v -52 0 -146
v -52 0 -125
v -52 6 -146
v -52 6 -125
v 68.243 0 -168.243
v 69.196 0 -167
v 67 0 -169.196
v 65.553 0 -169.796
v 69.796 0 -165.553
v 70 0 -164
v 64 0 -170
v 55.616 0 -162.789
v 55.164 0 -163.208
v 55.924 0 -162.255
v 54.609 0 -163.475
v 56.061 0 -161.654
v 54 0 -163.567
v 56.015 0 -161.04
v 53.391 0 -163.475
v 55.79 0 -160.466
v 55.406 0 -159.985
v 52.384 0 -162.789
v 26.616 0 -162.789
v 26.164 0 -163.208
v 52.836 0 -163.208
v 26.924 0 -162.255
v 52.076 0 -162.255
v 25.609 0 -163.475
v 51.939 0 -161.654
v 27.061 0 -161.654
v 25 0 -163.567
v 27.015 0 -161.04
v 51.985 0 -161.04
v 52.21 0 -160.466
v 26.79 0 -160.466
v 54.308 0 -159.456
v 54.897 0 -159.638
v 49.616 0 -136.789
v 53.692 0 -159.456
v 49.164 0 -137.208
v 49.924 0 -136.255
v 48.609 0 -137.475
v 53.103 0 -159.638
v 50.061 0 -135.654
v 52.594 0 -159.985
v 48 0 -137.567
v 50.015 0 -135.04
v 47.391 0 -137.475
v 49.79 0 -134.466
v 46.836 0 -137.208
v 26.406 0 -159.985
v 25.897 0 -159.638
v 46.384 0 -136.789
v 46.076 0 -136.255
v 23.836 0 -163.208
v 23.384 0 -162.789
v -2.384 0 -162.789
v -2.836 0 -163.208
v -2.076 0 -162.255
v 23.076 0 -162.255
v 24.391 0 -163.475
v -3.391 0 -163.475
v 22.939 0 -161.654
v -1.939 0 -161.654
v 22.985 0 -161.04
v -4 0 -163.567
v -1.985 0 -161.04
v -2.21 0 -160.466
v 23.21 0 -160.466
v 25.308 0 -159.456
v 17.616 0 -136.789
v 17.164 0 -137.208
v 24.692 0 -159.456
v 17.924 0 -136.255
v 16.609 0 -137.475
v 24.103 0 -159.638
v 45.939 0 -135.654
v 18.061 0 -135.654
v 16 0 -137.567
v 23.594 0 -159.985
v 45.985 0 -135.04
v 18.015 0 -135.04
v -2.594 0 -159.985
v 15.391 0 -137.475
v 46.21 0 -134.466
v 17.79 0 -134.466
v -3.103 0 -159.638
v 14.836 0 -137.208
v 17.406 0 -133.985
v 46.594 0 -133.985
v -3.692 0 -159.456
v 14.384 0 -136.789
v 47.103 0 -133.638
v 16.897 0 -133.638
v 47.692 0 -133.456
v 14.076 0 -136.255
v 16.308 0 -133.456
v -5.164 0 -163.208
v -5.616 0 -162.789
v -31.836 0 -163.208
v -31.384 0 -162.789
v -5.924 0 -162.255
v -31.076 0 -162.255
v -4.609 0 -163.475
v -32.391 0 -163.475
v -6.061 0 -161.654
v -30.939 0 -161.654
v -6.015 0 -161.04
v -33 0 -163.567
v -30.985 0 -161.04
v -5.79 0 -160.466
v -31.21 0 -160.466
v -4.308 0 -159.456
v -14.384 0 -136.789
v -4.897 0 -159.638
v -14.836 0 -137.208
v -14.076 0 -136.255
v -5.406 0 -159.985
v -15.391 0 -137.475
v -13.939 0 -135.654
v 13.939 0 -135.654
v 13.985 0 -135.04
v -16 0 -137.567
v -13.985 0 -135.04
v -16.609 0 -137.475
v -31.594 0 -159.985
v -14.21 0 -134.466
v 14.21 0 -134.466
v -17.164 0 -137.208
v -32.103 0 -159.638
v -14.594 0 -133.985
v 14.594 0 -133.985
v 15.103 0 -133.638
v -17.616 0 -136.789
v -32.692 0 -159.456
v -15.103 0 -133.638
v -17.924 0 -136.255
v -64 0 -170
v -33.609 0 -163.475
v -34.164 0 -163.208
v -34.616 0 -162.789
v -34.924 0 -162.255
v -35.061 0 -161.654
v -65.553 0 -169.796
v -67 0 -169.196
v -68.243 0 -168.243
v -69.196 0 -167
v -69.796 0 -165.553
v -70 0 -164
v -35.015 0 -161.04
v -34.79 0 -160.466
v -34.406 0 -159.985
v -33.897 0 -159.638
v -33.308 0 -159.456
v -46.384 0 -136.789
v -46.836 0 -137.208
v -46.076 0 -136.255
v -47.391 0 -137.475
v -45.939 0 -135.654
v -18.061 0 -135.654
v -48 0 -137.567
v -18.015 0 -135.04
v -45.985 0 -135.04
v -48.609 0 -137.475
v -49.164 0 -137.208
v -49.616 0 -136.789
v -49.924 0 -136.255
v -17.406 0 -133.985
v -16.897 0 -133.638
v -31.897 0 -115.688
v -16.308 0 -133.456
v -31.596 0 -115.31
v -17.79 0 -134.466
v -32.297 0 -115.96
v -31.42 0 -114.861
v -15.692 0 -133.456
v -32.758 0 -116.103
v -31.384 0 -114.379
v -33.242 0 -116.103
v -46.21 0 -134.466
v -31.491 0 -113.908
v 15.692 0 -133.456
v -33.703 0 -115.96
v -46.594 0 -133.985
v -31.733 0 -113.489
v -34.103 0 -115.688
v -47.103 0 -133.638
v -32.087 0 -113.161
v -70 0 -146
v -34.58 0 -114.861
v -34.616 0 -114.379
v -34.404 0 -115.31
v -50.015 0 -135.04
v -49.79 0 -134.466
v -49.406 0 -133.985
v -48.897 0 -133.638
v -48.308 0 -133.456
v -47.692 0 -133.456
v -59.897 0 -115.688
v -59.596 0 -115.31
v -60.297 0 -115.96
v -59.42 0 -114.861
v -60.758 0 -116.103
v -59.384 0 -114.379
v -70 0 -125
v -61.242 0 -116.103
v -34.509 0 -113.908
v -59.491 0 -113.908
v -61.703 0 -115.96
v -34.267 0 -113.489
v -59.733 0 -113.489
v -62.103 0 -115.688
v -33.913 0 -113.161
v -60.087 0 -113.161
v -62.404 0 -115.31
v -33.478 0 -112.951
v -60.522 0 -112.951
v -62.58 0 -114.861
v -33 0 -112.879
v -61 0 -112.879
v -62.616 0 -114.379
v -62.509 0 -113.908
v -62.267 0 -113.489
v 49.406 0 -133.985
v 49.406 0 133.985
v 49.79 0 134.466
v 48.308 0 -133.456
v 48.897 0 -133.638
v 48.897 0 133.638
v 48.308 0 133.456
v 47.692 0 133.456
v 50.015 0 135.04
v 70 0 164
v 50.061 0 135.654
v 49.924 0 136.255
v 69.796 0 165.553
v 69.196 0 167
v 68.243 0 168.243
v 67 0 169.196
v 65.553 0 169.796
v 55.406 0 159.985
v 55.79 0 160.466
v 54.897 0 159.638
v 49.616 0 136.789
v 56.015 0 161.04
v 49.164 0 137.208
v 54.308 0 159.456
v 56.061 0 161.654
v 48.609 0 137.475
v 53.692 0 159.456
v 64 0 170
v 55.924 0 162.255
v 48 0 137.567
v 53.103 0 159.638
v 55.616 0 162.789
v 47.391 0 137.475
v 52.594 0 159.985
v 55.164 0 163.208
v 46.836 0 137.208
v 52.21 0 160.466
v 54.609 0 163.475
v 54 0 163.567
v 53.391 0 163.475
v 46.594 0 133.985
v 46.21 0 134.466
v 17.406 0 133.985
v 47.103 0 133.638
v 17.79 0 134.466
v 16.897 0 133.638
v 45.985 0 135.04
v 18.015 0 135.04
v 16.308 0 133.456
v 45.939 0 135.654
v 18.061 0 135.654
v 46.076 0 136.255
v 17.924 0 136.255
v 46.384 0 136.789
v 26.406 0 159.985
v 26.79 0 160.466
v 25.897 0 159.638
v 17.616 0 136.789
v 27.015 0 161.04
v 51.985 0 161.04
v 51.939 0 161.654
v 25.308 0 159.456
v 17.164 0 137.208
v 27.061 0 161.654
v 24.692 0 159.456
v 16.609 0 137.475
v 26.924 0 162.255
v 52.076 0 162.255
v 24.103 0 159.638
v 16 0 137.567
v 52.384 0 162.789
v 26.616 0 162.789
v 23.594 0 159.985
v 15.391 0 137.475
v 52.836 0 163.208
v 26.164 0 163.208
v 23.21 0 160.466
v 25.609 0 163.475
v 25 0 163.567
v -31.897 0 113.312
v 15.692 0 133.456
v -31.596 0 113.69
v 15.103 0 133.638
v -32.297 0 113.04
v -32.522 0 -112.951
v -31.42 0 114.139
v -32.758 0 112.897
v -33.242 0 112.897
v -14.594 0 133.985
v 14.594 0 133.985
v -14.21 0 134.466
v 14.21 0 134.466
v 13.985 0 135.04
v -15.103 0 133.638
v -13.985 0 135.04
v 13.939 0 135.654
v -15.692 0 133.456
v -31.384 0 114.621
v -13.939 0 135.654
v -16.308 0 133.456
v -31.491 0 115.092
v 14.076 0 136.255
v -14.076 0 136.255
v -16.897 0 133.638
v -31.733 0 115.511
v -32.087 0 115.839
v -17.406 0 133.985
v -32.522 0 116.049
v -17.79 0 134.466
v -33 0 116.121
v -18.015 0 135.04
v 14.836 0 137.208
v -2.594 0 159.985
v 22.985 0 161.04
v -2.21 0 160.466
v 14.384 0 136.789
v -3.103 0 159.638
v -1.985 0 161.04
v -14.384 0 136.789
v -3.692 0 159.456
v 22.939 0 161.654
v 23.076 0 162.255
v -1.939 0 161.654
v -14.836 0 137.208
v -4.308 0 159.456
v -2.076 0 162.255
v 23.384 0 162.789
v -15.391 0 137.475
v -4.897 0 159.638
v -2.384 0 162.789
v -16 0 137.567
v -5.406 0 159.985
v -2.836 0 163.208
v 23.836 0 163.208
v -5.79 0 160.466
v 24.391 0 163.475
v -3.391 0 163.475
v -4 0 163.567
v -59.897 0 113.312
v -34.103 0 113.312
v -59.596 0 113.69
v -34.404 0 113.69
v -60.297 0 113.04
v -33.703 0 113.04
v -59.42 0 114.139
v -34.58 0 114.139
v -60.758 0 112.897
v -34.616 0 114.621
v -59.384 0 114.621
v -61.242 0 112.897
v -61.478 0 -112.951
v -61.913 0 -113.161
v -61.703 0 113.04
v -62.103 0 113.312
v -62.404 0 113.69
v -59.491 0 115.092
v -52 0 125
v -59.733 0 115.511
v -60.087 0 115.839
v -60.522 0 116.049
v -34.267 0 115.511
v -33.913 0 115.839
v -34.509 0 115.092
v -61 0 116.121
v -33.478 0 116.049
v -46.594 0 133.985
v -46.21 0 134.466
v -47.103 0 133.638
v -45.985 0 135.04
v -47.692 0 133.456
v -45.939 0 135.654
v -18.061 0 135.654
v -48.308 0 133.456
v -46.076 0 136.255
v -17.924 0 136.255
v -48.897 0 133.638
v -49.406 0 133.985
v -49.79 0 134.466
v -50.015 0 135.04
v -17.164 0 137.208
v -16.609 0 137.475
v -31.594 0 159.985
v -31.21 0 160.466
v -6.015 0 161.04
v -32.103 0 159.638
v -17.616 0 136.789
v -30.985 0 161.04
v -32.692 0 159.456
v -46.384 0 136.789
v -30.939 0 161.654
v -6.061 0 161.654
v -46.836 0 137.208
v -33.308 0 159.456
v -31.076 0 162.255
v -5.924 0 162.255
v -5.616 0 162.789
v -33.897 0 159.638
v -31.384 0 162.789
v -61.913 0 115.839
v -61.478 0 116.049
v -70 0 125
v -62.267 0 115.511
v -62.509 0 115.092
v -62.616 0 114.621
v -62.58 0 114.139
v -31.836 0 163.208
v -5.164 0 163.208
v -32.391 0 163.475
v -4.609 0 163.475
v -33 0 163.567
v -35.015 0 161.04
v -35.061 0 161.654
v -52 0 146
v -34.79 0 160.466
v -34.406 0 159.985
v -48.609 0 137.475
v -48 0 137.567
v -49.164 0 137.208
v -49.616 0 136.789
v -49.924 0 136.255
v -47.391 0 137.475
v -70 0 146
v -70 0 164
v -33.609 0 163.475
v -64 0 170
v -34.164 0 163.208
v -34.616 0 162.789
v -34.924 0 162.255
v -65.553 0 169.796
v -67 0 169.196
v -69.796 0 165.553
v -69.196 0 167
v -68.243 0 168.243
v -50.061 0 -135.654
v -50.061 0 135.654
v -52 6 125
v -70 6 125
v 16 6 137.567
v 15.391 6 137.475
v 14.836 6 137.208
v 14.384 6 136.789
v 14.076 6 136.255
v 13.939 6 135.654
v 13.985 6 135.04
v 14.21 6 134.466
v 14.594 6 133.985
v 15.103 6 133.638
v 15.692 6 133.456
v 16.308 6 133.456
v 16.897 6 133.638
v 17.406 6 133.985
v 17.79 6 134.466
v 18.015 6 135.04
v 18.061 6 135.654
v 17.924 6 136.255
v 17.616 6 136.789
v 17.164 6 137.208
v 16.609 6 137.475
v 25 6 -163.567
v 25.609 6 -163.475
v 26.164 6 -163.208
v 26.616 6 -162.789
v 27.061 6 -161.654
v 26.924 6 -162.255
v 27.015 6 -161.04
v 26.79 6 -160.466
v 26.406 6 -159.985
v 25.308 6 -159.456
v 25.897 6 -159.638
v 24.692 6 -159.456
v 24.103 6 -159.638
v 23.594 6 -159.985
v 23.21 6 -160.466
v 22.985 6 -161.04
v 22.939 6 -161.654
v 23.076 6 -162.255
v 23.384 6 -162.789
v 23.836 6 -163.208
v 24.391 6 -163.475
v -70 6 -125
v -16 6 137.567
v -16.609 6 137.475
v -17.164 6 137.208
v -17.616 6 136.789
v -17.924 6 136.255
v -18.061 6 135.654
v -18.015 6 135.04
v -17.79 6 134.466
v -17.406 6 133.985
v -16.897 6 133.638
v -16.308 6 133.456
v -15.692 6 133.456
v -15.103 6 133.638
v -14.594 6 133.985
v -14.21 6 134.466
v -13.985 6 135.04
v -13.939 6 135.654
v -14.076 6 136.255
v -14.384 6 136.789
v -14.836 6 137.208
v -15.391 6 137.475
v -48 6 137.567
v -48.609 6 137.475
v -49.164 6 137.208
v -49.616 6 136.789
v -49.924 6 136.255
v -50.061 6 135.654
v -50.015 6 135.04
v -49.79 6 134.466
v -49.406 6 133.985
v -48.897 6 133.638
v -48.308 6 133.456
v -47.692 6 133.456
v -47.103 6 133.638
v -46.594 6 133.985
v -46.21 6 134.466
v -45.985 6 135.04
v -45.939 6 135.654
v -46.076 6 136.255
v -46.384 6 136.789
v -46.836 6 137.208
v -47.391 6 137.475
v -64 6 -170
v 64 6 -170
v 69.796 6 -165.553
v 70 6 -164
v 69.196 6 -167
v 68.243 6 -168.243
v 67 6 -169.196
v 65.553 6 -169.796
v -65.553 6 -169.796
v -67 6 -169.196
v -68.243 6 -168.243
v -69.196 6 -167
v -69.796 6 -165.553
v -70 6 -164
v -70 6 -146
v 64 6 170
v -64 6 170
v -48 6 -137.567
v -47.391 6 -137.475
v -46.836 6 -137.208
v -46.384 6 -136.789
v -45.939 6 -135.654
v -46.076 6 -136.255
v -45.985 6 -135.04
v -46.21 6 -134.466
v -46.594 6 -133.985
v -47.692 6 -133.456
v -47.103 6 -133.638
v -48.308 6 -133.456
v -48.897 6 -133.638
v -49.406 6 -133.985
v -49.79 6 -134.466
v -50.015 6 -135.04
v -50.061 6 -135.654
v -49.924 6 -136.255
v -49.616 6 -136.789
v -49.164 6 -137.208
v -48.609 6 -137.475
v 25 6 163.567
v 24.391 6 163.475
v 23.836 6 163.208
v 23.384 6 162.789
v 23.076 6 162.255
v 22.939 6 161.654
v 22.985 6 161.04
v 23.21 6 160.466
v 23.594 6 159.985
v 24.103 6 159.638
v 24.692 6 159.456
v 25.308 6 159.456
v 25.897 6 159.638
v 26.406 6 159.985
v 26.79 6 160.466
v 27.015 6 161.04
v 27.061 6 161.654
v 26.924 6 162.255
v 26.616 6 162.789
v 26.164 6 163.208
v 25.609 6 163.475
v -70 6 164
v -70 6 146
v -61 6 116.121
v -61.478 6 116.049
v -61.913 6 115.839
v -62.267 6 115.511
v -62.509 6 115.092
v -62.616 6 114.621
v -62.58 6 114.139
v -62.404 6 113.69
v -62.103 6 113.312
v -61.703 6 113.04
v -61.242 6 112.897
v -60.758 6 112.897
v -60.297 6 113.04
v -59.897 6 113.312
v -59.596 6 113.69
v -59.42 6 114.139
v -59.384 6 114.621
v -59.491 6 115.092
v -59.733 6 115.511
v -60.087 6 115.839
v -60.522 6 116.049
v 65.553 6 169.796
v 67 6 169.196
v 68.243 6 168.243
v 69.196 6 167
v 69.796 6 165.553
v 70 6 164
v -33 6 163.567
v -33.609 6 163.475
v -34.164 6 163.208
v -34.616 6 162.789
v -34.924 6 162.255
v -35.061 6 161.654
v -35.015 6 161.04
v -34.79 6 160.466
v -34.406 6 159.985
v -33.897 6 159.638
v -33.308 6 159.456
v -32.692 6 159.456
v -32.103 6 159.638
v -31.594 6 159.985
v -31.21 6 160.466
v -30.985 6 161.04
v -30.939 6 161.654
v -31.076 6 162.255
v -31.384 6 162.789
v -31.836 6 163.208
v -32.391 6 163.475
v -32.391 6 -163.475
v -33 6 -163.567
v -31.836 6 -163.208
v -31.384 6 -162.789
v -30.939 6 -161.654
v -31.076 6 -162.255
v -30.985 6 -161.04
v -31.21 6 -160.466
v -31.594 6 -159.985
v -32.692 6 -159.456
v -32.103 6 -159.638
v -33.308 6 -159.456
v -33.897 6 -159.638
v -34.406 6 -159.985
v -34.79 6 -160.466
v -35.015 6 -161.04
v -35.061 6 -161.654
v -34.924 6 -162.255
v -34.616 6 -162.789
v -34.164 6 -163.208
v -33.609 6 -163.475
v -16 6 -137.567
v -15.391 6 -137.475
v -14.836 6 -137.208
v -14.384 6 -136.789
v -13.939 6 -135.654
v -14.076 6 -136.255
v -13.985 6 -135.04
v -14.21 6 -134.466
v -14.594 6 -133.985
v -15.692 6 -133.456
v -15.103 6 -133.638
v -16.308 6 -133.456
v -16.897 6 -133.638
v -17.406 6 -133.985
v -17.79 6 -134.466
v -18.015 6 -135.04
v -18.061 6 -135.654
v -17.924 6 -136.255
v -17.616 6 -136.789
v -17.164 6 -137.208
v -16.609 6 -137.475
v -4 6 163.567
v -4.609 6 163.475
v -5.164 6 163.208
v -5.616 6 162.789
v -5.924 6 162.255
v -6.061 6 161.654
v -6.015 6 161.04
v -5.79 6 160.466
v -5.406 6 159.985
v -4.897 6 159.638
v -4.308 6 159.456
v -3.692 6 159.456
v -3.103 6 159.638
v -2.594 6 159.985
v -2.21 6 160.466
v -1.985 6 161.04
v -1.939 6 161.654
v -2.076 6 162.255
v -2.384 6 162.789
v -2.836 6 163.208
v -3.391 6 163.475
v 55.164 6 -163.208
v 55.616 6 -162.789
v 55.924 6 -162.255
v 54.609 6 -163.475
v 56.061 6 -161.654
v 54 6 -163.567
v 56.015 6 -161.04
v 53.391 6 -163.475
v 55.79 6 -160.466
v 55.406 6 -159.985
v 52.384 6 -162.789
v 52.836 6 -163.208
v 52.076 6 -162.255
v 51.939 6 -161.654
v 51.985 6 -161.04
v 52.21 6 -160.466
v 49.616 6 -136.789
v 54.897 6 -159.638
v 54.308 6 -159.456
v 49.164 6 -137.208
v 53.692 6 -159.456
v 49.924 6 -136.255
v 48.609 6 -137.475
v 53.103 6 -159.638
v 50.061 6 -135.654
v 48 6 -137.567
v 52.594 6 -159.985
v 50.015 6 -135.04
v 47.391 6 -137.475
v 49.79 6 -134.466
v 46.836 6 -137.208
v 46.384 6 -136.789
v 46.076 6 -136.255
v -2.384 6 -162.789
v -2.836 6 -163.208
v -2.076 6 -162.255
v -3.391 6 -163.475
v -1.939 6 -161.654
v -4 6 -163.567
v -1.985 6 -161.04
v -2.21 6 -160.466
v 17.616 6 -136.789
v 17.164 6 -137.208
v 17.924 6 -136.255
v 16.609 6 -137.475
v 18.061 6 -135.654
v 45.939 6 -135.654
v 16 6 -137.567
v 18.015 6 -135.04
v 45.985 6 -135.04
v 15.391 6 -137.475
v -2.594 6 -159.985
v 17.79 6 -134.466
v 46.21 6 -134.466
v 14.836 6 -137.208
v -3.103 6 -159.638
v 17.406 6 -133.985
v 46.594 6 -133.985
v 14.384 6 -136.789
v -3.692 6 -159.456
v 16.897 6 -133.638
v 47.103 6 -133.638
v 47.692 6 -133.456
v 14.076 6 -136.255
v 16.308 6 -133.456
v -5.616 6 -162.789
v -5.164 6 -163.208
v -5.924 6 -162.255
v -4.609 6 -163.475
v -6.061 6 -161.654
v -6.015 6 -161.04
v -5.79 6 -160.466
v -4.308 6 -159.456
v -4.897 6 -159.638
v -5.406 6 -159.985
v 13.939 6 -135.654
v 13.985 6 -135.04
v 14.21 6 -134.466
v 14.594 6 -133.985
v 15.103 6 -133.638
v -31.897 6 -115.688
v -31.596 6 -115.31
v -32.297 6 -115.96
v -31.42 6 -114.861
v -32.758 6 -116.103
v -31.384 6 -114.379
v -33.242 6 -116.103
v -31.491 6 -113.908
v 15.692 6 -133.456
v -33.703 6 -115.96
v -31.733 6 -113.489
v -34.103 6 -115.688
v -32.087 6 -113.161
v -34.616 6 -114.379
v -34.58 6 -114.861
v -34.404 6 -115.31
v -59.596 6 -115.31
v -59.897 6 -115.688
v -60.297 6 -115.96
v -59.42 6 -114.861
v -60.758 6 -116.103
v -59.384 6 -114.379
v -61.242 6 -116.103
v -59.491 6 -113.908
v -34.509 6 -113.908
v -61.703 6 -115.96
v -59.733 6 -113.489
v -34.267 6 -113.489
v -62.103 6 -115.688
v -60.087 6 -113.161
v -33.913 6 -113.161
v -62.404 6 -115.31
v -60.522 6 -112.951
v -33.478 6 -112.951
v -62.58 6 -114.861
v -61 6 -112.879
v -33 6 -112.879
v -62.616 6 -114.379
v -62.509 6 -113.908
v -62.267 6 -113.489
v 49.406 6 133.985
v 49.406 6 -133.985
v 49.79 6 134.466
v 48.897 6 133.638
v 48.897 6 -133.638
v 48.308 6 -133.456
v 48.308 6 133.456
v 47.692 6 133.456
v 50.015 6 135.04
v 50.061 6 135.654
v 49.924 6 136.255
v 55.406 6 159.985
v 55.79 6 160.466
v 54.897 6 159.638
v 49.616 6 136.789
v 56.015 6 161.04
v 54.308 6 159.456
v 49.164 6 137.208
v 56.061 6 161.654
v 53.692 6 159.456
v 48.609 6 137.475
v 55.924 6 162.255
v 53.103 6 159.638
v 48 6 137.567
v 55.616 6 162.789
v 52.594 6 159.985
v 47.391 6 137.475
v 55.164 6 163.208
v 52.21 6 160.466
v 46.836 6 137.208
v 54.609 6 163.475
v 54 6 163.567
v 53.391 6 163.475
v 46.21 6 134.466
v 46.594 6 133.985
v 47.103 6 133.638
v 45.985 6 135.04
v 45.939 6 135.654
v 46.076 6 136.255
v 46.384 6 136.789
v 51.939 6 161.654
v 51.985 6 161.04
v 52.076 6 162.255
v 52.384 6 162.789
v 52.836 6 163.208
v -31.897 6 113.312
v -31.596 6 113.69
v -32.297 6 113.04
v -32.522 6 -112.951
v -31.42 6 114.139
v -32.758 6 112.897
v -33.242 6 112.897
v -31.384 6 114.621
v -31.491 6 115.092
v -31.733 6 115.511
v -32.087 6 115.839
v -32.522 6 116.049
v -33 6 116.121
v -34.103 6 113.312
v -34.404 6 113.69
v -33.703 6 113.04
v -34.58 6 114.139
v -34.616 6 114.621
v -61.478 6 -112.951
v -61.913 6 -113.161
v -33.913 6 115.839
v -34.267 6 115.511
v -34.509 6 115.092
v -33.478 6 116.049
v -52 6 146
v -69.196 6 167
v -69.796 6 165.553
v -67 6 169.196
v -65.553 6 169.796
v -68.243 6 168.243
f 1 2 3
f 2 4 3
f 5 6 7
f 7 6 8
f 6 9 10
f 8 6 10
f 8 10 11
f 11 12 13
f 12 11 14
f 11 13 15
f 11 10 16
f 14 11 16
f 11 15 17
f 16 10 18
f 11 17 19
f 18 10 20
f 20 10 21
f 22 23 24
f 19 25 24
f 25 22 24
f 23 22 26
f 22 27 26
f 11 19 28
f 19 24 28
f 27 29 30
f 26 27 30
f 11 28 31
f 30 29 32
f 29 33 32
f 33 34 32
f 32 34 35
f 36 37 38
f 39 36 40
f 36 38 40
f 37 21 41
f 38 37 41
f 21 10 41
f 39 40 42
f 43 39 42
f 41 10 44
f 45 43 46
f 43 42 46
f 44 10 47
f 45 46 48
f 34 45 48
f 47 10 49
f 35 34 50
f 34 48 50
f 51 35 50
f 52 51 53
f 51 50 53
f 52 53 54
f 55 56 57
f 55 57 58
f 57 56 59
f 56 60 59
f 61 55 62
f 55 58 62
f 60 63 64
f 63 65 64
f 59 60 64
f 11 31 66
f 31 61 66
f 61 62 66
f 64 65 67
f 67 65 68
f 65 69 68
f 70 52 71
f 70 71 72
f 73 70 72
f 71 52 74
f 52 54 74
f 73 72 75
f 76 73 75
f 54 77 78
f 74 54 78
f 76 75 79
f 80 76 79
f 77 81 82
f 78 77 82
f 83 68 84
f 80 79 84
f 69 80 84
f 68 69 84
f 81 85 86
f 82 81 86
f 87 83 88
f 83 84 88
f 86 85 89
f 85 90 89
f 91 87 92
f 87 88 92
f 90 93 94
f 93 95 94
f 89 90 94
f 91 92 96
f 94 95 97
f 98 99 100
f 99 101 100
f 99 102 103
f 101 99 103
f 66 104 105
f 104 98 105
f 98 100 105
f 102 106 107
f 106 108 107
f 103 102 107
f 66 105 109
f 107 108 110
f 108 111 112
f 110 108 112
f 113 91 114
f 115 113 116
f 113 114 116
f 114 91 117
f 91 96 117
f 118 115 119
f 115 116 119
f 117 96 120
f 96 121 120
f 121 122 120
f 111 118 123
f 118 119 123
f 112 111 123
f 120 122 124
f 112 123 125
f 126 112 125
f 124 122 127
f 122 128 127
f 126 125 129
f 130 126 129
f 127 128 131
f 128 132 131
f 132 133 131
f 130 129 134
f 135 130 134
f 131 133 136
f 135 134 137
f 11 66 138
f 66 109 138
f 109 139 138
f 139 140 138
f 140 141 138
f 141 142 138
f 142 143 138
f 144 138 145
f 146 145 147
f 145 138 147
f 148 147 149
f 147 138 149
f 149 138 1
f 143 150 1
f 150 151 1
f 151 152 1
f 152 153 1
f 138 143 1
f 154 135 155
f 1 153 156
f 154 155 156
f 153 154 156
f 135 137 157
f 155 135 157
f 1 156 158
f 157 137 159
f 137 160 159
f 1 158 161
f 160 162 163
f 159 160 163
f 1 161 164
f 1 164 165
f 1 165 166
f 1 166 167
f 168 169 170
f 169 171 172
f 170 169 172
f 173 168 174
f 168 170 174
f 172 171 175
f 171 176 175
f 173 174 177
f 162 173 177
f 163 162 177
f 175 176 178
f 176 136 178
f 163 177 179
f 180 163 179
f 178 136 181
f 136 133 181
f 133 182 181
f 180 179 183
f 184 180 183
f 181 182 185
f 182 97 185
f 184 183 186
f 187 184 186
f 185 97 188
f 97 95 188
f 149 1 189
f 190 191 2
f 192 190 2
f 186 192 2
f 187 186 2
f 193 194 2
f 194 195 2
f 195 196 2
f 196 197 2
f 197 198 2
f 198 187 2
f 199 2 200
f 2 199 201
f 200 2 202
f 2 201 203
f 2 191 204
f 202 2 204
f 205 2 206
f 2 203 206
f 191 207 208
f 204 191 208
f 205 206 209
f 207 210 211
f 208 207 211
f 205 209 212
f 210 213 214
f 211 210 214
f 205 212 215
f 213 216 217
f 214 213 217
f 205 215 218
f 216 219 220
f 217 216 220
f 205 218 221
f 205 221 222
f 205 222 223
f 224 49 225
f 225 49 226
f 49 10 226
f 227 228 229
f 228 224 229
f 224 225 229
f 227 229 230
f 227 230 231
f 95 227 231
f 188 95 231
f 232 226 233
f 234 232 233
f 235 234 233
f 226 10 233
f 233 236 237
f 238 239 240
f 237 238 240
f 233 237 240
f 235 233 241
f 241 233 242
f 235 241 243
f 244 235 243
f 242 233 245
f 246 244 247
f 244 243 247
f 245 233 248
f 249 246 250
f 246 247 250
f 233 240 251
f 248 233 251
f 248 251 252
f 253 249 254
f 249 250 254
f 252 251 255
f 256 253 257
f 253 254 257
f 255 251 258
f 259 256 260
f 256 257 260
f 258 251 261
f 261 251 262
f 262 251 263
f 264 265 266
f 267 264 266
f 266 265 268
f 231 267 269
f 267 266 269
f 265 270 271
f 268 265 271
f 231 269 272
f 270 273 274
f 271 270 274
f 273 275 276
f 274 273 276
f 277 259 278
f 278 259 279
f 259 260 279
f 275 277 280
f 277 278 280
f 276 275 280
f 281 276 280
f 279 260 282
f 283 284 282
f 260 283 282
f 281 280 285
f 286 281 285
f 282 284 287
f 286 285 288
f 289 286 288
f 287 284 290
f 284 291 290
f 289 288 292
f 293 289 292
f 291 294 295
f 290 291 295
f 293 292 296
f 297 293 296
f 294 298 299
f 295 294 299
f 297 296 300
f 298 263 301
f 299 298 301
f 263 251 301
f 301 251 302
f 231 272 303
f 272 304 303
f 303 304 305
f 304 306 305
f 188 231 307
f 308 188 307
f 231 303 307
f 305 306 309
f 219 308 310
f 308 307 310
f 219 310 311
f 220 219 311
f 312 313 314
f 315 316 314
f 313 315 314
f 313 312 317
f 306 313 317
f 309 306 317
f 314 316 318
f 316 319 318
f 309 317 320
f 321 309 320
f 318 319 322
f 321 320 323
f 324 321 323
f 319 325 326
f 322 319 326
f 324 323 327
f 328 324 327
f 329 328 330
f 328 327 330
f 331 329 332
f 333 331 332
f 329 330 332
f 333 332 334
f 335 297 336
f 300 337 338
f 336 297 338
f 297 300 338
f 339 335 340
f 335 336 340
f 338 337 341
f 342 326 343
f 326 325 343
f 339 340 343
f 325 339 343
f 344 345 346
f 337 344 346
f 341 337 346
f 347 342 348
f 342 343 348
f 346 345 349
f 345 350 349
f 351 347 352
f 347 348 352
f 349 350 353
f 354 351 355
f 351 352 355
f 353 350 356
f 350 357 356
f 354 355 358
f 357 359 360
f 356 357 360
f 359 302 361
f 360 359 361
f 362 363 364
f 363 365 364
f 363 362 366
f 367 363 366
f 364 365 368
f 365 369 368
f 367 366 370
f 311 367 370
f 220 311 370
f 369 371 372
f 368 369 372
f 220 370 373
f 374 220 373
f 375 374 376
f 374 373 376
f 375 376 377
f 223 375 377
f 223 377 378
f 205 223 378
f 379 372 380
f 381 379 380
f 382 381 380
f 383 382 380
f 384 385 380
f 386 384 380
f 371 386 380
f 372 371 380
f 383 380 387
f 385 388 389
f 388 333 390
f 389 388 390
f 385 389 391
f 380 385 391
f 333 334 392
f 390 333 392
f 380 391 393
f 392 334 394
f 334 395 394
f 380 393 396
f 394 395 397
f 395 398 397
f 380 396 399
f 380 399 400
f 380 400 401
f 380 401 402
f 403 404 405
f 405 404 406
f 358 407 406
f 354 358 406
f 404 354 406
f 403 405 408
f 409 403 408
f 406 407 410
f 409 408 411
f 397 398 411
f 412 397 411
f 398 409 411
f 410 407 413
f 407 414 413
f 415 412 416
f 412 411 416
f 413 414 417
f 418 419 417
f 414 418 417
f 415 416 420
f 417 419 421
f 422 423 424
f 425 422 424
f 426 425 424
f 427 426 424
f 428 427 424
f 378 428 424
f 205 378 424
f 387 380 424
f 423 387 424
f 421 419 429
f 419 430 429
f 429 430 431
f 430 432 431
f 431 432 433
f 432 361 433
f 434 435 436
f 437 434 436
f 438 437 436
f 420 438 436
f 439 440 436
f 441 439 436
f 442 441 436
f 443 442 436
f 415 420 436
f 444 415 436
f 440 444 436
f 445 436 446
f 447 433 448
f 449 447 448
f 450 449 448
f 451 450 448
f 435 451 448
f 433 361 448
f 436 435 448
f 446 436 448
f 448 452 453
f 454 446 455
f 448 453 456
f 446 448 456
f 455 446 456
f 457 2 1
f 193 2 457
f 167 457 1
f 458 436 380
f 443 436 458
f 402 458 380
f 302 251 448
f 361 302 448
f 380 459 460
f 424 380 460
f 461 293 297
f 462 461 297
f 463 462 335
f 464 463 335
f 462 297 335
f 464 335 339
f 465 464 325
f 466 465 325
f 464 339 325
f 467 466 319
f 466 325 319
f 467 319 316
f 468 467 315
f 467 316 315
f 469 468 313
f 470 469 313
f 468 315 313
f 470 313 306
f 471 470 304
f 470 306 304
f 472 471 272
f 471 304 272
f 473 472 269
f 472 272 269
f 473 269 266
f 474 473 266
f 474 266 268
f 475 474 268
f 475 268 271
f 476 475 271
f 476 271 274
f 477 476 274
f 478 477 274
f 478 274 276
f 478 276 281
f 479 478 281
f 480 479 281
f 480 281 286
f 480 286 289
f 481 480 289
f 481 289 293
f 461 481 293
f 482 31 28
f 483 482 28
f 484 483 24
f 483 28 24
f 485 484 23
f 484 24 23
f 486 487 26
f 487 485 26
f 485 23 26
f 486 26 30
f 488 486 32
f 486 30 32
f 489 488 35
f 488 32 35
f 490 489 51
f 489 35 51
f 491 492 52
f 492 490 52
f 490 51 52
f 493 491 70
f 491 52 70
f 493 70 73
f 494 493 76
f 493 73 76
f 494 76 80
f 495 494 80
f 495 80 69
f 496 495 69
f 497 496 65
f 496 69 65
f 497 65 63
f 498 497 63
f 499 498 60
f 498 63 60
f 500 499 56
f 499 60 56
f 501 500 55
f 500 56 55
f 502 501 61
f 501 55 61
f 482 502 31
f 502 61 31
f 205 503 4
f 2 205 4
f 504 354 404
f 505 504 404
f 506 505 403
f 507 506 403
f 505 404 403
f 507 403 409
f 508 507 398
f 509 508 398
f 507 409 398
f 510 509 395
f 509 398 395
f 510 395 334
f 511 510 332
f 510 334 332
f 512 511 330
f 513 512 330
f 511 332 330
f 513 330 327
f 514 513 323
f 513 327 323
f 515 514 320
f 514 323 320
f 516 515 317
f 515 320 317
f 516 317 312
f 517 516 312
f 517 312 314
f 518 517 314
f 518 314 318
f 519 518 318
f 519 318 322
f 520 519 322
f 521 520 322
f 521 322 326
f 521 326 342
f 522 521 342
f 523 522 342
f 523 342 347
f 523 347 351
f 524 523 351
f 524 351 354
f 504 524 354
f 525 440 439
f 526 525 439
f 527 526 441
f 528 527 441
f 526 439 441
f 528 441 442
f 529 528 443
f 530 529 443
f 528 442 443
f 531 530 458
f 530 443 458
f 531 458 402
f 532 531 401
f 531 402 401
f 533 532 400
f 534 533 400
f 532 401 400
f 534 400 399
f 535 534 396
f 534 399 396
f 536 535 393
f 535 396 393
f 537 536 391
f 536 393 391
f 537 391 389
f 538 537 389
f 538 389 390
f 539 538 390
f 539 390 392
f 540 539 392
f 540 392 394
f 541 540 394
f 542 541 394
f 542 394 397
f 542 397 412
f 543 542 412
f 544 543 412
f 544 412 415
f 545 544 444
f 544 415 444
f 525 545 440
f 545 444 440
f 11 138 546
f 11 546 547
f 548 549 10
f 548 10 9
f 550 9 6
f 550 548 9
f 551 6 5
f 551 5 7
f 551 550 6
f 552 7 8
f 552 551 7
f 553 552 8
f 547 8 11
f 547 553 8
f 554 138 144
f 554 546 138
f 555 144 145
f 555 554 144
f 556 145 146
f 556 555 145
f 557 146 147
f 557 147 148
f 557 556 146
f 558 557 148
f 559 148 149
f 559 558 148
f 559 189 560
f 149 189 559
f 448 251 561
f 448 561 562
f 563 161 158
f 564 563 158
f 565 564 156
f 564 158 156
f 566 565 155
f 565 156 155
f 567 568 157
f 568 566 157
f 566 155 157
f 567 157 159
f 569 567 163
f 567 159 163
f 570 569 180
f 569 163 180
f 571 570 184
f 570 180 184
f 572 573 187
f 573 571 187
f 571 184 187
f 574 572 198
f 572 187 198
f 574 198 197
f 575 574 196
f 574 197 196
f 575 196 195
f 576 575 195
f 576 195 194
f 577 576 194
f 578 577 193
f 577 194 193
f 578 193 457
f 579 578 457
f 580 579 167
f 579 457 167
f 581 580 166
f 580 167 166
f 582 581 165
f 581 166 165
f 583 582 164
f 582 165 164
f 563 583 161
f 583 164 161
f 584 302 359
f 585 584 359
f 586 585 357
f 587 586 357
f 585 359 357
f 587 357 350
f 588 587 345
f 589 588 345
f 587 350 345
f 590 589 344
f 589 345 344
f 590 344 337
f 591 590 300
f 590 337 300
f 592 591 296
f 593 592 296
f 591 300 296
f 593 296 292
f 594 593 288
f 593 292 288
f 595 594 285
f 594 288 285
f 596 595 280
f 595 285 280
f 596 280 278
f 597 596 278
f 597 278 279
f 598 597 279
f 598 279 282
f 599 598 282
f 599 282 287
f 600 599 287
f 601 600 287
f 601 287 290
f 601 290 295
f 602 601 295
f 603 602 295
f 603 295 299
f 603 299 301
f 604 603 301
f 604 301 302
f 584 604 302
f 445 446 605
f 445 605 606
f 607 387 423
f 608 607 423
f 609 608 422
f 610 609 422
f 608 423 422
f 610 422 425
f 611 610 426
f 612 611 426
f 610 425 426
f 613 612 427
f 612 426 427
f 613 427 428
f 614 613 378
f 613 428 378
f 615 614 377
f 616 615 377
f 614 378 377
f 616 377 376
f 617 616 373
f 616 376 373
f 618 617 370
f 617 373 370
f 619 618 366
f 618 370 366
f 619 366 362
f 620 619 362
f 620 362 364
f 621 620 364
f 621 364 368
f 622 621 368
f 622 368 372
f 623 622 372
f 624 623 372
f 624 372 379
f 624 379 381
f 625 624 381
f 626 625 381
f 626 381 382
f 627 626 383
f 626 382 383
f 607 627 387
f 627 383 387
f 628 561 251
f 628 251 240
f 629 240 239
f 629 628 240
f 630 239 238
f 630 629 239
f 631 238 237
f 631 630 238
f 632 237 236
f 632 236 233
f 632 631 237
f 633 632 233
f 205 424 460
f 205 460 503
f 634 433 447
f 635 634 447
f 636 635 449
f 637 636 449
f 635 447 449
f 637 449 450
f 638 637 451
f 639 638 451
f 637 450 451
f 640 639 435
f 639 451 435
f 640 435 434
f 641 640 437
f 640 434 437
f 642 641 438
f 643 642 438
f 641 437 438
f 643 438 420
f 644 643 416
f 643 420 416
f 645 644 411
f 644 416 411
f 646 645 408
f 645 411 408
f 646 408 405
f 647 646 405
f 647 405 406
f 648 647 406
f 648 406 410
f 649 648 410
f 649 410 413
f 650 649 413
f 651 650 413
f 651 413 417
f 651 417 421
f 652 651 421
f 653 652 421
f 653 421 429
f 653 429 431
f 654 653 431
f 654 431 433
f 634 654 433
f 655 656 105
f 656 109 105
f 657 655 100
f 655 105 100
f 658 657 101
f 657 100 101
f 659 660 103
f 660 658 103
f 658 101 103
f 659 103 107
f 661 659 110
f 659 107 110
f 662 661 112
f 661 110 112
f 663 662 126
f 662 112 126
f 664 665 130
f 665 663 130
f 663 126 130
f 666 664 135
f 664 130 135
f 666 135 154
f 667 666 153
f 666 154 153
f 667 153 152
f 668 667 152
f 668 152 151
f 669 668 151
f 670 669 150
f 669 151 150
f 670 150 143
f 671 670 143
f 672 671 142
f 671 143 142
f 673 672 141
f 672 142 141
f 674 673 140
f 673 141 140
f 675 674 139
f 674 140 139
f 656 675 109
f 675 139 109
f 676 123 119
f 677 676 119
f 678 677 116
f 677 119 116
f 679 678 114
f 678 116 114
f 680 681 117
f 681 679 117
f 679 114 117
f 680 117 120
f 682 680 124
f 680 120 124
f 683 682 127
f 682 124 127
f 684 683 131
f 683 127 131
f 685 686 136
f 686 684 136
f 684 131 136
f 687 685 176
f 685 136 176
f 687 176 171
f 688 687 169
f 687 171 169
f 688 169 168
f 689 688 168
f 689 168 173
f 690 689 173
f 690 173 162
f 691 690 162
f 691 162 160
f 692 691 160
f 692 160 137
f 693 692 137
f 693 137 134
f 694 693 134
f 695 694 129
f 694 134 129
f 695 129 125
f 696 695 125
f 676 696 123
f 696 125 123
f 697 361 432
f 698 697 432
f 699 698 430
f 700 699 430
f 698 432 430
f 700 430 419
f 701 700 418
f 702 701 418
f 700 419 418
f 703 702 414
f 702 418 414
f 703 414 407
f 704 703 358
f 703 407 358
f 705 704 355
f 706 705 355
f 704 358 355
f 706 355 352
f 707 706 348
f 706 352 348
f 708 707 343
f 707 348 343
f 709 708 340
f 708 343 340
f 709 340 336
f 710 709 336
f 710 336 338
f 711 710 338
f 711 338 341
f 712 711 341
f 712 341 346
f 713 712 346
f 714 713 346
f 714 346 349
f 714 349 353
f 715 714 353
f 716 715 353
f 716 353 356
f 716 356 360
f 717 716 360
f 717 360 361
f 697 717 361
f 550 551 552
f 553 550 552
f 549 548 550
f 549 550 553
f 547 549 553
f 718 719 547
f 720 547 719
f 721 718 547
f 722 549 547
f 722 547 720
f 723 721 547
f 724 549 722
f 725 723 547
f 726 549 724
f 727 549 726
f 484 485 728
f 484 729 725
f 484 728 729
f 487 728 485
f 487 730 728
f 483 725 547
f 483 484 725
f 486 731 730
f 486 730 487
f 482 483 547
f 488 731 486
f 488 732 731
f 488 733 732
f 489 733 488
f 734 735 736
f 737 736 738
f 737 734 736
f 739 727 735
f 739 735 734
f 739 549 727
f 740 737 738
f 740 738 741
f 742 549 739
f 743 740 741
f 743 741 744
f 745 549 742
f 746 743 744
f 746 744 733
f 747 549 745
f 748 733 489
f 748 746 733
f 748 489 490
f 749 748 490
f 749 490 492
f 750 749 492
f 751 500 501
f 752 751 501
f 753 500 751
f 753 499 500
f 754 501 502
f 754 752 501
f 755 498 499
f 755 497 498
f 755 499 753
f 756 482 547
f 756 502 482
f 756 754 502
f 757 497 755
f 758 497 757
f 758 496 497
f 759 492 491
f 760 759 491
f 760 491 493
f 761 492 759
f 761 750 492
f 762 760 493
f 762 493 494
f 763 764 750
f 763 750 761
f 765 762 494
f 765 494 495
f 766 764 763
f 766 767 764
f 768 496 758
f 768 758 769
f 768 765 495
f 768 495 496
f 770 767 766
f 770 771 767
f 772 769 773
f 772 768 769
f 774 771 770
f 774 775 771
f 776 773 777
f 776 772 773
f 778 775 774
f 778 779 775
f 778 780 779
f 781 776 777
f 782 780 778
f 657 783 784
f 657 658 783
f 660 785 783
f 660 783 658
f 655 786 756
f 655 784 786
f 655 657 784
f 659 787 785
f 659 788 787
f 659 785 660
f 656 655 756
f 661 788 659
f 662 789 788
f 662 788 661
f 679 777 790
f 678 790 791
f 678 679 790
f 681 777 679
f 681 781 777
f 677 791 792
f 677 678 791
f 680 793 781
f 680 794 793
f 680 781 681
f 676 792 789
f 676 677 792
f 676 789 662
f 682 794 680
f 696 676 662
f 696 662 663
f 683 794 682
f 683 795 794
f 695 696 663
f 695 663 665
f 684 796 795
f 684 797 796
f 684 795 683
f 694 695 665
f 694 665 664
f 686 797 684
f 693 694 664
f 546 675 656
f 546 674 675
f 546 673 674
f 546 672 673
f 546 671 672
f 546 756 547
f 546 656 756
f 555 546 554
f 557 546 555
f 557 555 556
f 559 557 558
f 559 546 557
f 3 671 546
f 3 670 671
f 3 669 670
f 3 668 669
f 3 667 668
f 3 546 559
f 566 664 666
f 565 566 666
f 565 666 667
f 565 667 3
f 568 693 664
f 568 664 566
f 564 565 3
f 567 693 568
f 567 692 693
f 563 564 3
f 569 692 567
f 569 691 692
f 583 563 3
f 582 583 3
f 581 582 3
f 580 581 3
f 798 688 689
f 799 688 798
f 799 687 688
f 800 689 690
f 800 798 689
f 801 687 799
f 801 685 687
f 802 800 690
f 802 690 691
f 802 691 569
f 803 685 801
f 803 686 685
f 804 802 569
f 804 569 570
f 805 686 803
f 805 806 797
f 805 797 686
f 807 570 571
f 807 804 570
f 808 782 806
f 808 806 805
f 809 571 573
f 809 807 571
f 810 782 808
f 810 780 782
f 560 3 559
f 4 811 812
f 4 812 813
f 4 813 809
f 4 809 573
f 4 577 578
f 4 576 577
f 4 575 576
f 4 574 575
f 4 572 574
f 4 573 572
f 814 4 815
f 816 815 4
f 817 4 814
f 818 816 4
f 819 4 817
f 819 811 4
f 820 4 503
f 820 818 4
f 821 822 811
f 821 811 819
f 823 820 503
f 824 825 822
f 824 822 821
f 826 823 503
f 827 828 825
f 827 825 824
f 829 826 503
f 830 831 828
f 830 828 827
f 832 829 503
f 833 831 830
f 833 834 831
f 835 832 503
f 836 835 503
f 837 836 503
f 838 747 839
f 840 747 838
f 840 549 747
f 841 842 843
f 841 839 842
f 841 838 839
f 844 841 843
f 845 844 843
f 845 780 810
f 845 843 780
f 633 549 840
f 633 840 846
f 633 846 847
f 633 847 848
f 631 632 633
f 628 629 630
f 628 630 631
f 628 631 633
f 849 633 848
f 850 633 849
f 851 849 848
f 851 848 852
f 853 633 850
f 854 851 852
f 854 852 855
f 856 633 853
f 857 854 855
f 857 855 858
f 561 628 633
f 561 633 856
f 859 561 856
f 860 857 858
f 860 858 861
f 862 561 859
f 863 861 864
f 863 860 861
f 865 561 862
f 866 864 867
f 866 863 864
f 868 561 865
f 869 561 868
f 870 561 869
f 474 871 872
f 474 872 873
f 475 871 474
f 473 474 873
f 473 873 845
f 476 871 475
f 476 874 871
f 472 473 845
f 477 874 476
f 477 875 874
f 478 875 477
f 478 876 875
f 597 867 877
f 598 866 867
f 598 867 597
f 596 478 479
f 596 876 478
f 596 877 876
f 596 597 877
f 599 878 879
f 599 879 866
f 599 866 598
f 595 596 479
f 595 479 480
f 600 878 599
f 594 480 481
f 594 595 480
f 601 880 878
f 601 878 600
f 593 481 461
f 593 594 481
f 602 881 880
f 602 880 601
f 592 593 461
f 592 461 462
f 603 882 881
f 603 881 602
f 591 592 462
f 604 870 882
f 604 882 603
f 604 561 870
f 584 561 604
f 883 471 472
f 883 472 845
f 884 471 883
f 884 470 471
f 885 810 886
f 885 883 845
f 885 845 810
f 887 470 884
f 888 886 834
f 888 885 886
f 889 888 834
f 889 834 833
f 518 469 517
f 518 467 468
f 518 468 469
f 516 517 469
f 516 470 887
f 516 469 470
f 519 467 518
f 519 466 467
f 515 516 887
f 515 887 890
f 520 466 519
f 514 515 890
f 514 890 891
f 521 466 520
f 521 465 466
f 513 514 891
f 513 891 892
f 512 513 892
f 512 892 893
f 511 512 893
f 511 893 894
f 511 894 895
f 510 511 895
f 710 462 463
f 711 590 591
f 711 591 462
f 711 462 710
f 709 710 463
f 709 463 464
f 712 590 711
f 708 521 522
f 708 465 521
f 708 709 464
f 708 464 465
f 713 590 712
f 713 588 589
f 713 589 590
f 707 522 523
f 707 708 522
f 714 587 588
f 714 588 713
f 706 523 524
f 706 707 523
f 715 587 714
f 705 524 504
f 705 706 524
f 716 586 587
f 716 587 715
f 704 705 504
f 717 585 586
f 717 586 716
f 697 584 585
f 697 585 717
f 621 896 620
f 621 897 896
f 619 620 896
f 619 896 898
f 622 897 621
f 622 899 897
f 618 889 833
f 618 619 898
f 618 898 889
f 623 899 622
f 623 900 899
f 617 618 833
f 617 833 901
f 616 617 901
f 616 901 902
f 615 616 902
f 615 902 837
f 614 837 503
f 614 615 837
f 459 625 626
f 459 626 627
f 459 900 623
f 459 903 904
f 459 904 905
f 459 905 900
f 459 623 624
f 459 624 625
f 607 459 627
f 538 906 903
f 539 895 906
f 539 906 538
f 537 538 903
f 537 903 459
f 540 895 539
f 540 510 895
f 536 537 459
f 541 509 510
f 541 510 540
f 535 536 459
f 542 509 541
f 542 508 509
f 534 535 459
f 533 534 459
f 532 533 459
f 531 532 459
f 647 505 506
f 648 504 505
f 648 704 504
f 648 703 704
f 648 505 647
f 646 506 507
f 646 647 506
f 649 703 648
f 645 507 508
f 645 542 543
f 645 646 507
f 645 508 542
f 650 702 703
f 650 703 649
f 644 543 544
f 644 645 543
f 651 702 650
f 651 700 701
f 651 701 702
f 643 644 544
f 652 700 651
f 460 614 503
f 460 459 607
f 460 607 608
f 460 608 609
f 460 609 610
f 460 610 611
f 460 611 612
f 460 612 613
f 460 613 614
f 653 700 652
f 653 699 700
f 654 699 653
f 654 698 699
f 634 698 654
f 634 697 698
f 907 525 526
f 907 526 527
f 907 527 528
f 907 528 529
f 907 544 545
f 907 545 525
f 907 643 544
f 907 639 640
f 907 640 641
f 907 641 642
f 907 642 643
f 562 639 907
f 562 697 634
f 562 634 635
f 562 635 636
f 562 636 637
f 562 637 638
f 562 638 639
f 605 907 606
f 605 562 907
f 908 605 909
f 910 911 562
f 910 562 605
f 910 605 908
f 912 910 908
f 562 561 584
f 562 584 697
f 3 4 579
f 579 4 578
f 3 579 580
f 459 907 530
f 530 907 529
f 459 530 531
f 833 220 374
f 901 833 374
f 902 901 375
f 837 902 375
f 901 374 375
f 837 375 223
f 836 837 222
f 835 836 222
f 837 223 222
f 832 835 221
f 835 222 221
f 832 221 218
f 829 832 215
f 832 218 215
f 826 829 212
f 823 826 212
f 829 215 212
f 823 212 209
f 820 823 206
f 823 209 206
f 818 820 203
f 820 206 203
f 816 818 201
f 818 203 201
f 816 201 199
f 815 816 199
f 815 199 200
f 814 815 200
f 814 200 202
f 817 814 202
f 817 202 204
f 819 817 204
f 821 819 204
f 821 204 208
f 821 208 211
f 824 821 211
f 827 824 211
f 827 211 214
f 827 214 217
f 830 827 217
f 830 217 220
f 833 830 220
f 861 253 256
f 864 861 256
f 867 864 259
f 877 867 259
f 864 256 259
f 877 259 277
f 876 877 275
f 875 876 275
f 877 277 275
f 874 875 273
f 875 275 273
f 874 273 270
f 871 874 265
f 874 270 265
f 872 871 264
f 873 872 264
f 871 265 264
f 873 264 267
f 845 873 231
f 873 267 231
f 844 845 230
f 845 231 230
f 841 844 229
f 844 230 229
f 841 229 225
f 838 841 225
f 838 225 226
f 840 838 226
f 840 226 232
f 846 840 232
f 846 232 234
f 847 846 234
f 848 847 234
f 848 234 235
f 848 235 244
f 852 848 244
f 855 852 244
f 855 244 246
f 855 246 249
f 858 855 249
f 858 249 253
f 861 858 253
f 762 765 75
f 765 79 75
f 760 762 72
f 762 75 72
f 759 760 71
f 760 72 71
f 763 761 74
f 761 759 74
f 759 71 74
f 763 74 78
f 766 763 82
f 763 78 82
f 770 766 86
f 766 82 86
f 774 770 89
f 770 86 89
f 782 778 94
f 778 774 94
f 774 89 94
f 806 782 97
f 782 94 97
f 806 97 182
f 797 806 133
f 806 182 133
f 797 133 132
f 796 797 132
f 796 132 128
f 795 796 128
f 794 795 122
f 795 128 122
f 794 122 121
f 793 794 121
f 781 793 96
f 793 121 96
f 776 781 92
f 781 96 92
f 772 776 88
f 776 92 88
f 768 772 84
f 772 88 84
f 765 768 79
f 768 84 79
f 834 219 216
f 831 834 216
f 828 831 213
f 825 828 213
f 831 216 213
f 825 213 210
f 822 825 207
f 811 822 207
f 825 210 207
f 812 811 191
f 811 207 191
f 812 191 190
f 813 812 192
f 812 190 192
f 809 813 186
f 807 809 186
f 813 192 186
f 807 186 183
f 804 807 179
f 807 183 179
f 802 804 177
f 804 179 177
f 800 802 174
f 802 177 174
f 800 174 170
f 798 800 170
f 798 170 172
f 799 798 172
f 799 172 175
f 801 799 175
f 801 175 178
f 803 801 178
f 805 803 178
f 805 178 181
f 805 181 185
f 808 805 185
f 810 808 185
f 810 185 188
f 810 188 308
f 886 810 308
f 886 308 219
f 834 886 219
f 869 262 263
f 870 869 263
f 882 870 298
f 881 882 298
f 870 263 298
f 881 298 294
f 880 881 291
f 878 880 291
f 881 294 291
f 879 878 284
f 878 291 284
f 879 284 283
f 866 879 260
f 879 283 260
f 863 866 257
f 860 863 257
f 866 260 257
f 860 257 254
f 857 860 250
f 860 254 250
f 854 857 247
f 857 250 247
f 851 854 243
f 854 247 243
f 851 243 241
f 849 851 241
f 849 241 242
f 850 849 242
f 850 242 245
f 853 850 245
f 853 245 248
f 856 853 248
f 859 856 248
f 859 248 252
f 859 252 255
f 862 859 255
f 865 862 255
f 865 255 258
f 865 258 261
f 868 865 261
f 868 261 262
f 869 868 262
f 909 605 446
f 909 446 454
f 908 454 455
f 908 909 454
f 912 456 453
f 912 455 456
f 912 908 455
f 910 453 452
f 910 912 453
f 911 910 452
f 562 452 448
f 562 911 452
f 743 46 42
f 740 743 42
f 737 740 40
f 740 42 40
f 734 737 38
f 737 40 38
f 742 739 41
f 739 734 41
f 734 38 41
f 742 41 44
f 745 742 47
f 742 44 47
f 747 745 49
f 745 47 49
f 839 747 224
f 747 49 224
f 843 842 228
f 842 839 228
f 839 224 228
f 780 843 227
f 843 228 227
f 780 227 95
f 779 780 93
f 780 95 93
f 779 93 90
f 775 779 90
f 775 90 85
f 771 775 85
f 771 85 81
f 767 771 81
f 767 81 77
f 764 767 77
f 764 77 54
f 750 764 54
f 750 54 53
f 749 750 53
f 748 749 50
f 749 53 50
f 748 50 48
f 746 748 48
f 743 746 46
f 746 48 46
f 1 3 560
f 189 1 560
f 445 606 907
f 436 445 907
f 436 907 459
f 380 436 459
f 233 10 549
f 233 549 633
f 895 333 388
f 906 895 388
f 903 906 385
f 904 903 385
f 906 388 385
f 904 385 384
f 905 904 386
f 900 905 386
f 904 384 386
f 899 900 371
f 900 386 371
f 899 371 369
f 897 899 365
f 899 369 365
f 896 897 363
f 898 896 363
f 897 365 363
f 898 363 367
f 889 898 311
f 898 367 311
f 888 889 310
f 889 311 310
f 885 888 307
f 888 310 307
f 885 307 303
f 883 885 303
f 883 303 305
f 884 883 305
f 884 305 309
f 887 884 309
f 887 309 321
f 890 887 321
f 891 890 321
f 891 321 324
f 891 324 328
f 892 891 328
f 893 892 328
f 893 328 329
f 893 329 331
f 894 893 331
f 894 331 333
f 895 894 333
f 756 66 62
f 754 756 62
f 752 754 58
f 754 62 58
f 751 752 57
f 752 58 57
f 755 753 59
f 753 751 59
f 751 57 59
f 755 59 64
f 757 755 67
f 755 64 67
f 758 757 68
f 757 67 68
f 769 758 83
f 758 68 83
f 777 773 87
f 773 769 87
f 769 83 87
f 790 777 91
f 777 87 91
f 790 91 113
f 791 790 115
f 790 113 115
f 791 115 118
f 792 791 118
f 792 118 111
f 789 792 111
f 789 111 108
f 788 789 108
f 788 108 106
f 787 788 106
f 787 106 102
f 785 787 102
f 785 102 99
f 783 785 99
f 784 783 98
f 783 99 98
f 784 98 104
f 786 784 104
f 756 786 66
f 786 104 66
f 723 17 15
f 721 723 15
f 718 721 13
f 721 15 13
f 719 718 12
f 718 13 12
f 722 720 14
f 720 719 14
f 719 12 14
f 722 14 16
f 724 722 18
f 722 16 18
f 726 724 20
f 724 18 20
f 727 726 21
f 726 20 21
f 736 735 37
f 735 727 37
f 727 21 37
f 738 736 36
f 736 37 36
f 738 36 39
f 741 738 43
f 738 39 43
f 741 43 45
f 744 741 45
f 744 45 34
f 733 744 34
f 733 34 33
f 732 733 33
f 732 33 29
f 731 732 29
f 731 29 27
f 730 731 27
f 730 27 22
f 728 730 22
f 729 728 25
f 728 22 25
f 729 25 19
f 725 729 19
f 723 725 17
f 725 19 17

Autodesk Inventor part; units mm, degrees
ref_plane "YZ Plane" through (0, 0, 0) normal (1, 0, 0) x (0, 1, 0)
ref_plane "XZ Plane" through (0, 0, 0) normal (0, 1, 0) x (-1, 0, 0)
sketch "Skizze1" plane through (0, 0, 0) normal (0, 1, 0) x (-1, 0, 0)
  line L0 (-70, 170) -> (70, 170)
  line L1 (70, 170) -> (70, -170)
  line L2 (70, -170) -> (-70, -170)
  line L3 (-70, -170) -> (-70, 170)
  line L4 (-70, 170) -> (70, -170) construction
  line L5 (70, 170) -> (-70, -170) construction
  point P0 (0, 0)
  dimension "d0" = 340
  dimension "d1" = 140
extrude "Extrusion1" add sketch "Skizze1" along normal blind 6
sketch "Skizze2" plane through (0, 6, 0) normal (0, 1, 0) x (1, 0, 0)
  line L0 (-70, 170) -> (-70, -170) projected
  line L1 (-70, -146) -> (-52, -146)
  line L2 (-52, -146) -> (-52, -125)
  line L3 (-52, -125) -> (-70, -125)
  line L4 (-70, 125) -> (-52, 125)
  line L5 (-52, 125) -> (-52, 146)
  line L6 (-52, 146) -> (-70, 146)
  line L7 (-70, -170) -> (70, -170) projected
  line L8 (70, 170) -> (-70, 170) projected
  point P0 (0, 0)
  dimension "d4" = 21
  dimension "d5" = 21
  dimension "d6" = 24
  dimension "d7" = 24
  dimension "d8" = 18
extrude "Extrusion2" cut sketch "Skizze2" against normal up to surface (6 mm away)
sketch "Skizze3" plane through (0, 6, 0) normal (0, 1, 0) x (1, 0, 0)
  line L0 (70, -170) -> (70, 170) projected
  line L1 (-52, -125) -> (-52, -146) projected
  point P0 (0, 0)
  point P1 (-48, -135.5)
  point P2 (-16, -135.5)
  point P3 (16, -135.5)
  point P4 (48, -135.5)
  point P5 (-52, -135.5)
  dimension "d11" = 22
  dimension "d12" = 32
  dimension "d13" = 32
  dimension "d14" = 32
hole "Bohrung1" at (-48, 6, 135.5) at (-16, 6, 135.5) at (16, 6, 135.5) at (48, 6, 135.5) direction (0, -1, 0) diameter 4.134 depth 6 thread size "M5x0.8" class "6H" standard "ISO Metric profile"
fillet "Rundung1" radius 6 4 edges at (-70, 3, 170) (70, 3, 170) (70, 3, -170) (-70, 3, -170)
sketch "Skizze4" plane through (0, 6, 0) normal (0, 1, 0) x (1, 0, 0)
  circle A0 centre (48, -135.5) radius 2.067 projected
  line L0 (70, -164) -> (70, 164) projected
  point P0 (0, 0)
  point P1 (54, -161.5)
  point P2 (25, -161.5)
  point P3 (-4, -161.5)
  point P4 (-33, -161.5)
  dimension "d23" = 26
  dimension "d24" = 16
  dimension "d25" = 29
  dimension "d26" = 29
  dimension "d27" = 29
hole "Bohrung2" at (54, 6, 161.5) at (25, 6, 161.5) at (-4, 6, 161.5) at (-33, 6, 161.5) direction (0, -1, 0) diameter 4.134 depth 6 thread size "M5x0.8" class "6H" standard "ISO Metric profile"
ref_plane "Arbeitsebene1" through (0, 0, 0) normal (0, 0, 1) x (1, 0, 0)
mirror "Spiegeln1" about plane through (0, 0, 0) normal (0, 0, 1) of "Bohrung2", "Bohrung1"
sketch "Skizze5" plane through (0, 6, 0) normal (0, 1, 0) x (1, 0, 0)
  line L0 (-70, -125) -> (-52, -125) projected
  point P0 (0, 0)
  point P1 (-61, -114.5)
  point P2 (-61, 114.5)
  point P3 (-61, -125)
  dimension "d36" = 114.5
  dimension "d37" = 114.5
hole "Bohrung3" at (-61, 6, 114.5) at (-61, 6, -114.5) direction (0, -1, 0) diameter 3.242 depth 6 thread size "M4x0.7" class "6H" standard "ISO Metric profile"
sketch "Skizze6" plane through (0, 6, 0) normal (0, 1, 0) x (1, 0, 0)
  line L0 (-52, -125) -> (-52, -146) projected
  point P0 (0, 0)
  point P1 (-33, -114.5)
  point P2 (-33, 114.5)
  dimension "d45" = 19
  dimension "d46" = 114.5
  dimension "d47" = 114.5
hole "Bohrung4" at (-33, 6, 114.5) at (-33, 6, -114.5) direction (0, -1, 0) diameter 3.242 depth 6 thread size "M4x0.7" class "6H" standard "ISO Metric profile"
equation "\"d26\" = d25"
equation "\"d27\" = d25"
equation "\"d37\" = d36"
properties part number "1011"
